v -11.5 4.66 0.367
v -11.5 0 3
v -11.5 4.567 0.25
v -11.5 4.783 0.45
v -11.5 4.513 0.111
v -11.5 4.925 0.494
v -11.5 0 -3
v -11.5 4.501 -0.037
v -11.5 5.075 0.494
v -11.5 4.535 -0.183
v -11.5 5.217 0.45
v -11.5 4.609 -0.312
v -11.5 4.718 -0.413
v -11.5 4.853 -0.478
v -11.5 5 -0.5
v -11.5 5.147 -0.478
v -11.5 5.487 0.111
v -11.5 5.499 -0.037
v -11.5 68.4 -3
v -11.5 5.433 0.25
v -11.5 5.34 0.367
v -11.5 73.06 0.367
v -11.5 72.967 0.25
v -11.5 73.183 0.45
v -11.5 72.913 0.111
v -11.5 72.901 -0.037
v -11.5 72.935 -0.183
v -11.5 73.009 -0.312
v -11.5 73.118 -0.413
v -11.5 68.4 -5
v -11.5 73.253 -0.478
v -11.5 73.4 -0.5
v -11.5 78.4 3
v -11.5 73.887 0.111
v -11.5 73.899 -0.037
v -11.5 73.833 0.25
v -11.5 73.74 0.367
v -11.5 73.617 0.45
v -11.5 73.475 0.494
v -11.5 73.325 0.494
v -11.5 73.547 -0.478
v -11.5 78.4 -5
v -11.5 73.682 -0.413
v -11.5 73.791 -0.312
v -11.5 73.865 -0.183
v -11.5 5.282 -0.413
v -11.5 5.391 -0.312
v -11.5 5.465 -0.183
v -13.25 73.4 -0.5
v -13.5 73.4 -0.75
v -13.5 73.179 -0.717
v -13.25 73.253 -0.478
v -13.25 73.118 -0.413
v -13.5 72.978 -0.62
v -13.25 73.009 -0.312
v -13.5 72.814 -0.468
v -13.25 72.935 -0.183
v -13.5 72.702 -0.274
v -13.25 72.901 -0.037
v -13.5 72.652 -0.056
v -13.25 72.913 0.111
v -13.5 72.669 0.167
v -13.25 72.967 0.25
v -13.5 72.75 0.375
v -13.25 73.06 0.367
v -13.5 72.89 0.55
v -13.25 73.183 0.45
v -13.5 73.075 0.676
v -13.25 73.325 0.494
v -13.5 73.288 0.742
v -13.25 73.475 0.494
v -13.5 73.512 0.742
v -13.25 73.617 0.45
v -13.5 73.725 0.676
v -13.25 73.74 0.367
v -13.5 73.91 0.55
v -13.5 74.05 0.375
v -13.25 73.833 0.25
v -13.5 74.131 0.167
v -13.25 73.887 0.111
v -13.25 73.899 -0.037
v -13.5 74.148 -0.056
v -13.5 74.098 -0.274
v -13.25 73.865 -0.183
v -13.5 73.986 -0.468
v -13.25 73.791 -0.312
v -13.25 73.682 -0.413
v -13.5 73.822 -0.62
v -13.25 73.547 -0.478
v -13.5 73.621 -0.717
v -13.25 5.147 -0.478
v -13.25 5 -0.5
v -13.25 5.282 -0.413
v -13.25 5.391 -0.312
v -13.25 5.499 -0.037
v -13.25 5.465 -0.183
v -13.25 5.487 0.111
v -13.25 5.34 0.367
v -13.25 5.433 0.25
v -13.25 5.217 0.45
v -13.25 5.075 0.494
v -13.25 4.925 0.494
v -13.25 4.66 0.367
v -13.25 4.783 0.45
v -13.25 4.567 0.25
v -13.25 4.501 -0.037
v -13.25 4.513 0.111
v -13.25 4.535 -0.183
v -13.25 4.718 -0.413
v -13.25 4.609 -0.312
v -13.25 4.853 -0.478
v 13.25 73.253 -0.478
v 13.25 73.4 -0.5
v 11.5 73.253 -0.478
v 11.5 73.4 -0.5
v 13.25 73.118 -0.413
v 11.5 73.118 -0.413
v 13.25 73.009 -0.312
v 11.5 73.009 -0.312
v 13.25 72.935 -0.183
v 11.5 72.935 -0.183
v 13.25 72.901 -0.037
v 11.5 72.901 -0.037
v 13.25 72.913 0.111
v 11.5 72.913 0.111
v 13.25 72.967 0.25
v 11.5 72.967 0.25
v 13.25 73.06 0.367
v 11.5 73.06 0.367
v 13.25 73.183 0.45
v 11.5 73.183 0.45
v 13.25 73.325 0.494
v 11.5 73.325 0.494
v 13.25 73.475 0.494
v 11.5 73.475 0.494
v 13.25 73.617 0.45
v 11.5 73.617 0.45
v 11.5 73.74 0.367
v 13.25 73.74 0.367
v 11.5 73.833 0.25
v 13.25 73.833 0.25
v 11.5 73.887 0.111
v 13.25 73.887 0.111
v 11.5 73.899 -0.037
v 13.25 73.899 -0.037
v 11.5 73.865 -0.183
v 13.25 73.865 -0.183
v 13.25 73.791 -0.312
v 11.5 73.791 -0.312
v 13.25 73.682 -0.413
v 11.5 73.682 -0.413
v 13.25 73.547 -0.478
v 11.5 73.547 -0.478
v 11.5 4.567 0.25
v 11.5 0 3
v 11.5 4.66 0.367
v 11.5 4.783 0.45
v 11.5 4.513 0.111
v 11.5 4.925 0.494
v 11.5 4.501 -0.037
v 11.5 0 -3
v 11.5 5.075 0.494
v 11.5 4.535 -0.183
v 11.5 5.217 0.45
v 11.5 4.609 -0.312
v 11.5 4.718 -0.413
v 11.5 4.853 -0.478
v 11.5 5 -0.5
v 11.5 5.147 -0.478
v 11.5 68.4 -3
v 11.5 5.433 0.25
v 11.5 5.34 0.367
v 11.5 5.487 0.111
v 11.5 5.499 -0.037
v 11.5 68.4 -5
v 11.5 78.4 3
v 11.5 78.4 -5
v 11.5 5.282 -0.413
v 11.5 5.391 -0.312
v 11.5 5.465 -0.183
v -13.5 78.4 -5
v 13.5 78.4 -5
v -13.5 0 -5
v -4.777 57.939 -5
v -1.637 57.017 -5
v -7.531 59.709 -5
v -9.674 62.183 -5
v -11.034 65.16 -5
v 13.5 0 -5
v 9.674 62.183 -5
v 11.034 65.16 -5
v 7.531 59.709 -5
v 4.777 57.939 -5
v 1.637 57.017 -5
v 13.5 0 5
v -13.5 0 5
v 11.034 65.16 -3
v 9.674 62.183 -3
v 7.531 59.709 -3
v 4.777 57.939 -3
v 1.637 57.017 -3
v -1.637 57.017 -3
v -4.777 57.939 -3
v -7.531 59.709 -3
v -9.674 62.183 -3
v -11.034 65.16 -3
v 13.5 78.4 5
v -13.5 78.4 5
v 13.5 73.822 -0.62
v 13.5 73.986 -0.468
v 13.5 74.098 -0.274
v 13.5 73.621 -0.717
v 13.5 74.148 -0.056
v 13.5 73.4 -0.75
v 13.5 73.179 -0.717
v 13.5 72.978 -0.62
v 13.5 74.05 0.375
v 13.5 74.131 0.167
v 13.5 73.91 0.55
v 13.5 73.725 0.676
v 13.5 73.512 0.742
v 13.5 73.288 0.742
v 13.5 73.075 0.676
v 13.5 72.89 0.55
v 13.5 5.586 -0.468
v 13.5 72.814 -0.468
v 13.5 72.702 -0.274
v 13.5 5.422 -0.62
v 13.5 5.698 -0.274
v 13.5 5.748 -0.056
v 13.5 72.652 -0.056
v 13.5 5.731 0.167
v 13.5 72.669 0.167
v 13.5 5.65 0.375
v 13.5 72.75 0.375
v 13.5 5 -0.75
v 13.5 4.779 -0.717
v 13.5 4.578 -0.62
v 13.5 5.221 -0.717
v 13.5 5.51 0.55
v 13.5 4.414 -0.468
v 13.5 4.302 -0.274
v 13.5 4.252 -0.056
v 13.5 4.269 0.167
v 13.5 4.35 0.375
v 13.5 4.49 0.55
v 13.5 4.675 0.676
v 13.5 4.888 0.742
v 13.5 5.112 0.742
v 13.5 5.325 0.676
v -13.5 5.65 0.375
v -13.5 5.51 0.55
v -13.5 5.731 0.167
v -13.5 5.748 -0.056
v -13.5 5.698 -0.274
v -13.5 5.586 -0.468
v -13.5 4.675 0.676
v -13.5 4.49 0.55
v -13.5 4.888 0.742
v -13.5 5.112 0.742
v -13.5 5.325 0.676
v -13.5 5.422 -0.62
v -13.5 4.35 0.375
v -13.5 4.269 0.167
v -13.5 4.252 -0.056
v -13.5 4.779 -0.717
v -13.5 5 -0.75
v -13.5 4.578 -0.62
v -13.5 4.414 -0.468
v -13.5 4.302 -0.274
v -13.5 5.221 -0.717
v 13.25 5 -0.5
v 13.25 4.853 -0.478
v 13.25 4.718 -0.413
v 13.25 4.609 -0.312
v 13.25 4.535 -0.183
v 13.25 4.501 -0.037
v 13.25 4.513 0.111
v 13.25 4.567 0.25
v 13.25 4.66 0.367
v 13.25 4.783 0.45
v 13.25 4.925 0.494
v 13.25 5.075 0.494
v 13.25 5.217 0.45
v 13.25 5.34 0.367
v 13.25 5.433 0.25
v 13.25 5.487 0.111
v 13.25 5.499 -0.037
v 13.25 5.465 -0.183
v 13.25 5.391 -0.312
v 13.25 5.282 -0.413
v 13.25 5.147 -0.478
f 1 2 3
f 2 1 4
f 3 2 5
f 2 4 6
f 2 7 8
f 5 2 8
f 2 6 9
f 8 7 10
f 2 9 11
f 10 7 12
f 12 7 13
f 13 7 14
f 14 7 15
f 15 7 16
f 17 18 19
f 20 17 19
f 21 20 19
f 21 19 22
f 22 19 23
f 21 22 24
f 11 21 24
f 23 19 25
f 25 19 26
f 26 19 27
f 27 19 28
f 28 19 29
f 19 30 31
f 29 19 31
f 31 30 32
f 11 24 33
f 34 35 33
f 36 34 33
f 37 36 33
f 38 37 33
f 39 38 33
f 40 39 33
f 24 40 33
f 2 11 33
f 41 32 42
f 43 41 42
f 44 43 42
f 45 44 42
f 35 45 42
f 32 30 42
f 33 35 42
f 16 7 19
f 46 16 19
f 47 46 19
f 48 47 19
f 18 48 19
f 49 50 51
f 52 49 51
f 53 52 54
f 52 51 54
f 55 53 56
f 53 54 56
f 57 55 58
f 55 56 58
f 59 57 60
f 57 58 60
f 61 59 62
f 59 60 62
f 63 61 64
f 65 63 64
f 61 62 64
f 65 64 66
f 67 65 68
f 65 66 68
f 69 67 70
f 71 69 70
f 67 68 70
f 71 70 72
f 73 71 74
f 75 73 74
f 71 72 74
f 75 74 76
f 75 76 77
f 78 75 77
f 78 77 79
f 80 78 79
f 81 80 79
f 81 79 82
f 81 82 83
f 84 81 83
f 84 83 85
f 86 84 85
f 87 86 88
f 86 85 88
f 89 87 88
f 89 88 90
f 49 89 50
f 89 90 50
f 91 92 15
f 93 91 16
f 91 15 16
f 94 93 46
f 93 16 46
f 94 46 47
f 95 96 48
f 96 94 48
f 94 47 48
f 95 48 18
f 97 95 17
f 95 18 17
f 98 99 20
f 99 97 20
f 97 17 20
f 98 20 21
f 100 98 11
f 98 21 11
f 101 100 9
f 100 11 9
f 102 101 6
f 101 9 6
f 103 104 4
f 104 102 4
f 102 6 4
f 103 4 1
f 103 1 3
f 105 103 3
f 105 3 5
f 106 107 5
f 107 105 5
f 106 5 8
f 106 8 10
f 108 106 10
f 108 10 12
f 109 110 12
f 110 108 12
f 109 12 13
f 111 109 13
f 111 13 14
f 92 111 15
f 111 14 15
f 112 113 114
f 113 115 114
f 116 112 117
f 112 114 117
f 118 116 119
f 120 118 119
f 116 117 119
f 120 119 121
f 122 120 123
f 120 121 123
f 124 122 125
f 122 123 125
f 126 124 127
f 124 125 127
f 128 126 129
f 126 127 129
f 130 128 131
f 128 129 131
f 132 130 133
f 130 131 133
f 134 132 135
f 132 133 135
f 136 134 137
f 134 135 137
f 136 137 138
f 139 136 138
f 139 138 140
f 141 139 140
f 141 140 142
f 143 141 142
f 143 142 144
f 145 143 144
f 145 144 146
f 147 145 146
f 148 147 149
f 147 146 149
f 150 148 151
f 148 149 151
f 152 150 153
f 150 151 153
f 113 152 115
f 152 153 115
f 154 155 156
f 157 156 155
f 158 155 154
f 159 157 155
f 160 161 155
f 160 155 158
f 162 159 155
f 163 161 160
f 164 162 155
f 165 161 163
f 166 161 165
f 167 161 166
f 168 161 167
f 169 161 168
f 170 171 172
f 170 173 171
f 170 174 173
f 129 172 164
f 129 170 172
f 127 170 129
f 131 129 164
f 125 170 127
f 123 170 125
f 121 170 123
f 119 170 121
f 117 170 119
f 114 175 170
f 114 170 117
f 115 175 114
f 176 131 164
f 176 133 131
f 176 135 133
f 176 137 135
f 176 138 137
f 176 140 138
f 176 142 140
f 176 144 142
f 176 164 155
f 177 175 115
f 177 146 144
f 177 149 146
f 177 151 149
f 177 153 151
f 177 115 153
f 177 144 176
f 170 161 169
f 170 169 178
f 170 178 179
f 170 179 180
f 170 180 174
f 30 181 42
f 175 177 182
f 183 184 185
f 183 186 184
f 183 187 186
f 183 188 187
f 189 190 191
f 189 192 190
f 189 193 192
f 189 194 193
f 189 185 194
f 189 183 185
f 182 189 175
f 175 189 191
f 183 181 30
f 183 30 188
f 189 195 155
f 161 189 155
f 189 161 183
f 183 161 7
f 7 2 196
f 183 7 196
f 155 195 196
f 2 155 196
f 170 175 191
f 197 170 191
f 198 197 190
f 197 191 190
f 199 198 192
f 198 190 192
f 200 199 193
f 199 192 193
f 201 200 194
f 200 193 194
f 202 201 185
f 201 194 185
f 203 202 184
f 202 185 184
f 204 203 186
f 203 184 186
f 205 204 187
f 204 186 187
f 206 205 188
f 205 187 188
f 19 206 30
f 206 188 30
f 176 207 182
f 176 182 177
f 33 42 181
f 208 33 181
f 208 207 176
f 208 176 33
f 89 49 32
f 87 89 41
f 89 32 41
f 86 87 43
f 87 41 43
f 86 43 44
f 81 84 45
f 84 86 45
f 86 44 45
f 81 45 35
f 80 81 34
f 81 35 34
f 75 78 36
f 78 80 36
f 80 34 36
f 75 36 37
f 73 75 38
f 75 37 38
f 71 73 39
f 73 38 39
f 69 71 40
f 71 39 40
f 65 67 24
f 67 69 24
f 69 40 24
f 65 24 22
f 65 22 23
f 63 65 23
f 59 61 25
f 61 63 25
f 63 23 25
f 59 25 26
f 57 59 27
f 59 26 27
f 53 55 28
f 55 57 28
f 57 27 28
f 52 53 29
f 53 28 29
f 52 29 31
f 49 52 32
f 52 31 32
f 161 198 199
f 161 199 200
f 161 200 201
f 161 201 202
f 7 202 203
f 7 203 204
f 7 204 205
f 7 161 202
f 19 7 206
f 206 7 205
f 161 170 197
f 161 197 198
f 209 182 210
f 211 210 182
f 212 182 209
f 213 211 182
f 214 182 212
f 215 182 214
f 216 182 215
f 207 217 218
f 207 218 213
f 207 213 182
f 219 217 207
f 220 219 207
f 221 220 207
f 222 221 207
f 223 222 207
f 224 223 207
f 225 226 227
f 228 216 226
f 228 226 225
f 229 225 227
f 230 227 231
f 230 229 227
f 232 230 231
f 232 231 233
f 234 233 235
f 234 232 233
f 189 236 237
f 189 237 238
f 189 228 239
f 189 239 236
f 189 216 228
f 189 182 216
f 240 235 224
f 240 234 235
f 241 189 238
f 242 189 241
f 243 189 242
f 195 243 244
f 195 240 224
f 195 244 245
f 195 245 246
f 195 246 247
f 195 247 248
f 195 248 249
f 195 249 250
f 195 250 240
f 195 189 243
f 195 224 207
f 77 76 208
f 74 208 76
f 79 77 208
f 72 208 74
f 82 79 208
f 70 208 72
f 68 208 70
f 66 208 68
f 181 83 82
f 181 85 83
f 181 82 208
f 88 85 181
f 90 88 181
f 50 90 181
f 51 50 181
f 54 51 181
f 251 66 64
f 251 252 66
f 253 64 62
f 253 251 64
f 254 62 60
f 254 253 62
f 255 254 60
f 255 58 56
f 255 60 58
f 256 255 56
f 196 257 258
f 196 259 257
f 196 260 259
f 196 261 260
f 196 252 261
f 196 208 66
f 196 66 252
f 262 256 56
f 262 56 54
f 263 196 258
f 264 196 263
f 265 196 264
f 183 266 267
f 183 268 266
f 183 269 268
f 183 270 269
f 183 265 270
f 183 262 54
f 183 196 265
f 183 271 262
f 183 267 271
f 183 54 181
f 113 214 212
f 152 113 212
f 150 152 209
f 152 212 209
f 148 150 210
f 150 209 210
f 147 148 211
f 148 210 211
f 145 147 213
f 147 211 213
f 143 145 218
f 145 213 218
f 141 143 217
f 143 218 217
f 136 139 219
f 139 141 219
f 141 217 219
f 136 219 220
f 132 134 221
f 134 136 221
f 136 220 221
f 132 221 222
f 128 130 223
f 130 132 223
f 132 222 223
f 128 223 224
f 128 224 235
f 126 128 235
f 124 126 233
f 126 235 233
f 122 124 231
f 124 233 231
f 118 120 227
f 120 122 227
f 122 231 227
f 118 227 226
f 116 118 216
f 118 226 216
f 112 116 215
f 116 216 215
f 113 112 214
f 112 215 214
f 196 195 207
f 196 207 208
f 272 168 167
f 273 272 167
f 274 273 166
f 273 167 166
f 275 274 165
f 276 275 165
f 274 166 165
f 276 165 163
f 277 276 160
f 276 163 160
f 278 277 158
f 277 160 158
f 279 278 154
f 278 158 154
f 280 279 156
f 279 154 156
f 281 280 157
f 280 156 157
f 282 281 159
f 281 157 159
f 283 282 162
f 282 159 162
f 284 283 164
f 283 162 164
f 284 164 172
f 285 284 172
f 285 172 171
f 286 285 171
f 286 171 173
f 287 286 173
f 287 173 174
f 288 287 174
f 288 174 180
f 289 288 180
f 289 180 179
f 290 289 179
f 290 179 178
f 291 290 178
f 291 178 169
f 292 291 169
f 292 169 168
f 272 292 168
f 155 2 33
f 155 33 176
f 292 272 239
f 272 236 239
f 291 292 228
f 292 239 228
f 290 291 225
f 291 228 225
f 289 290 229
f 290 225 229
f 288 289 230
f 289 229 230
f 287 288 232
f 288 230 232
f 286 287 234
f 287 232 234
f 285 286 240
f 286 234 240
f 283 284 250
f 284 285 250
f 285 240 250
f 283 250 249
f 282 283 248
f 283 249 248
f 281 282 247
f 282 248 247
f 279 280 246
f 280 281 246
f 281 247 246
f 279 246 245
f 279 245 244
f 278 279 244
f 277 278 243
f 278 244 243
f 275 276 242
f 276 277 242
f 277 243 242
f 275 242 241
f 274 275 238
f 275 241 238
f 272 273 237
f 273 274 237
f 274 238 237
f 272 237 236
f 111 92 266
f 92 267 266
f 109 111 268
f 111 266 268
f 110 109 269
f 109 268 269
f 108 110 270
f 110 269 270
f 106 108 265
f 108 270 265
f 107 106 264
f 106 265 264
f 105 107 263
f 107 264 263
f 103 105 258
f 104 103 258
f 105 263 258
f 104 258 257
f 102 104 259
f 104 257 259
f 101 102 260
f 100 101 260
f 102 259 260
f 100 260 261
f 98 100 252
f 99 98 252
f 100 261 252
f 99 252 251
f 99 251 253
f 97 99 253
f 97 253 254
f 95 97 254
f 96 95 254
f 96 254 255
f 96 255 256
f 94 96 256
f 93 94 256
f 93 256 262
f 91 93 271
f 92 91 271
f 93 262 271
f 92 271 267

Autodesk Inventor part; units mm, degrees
ref_plane "YZ Plane" through (0, 0, 0) normal (1, 0, 0) x (0, 1, 0)
ref_plane "XZ Plane" through (0, 0, 0) normal (0, 1, 0) x (-1, 0, 0)
ref_plane "XY Plane" through (0, 0, 0) normal (0, 0, 1) x (1, 0, 0)
sketch "Эскиз1" plane through (0, 0, 0) normal (0, 1, 0) x (-1, 0, 0)
  line L0 (13.5, -5) -> (-13.5, -5)
  line L1 (-13.5, -5) -> (-13.5, 5)
  line L2 (-13.5, 5) -> (13.5, 5)
  line L3 (13.5, 5) -> (13.5, -5)
  line L4 (-13.5, -5) -> (13.5, 5) construction
  line L5 (13.5, -5) -> (-13.5, 5) construction
  line L6 (-11.5, -3) -> (11.5, -3)
  line L7 (11.5, -3) -> (11.5, 3)
  line L8 (11.5, 3) -> (-11.5, 3)
  line L9 (-11.5, 3) -> (-11.5, -3)
  point P0 (0, 0)
  point P1 (0, 0)
  dimension "d0" = 27
  dimension "d1" = 10
  dimension "d2" = 2
extrude "Выдавливание1" add sketch "Эскиз1" along normal blind 78.4
sketch "Эскиз2" plane through (13.5, 0, 5) normal (1, 0, 0) x (0, 0, -1)
  line L0 (0, 78.4) -> (10, 78.4) construction
  line L1 (10, 78.4) -> (0, 68.4) construction
  line L2 (0, 0) -> (0, 78.4) construction
  line L3 (0, 78.4) -> (10, 68.4) construction
  line L4 (10, 0) -> (10, 78.4) construction
  line L5 (10, 0) -> (0, 10) construction
  line L6 (0, 0) -> (10, 10) construction
  circle A0 centre (5, 73.4) radius 0.5
  circle A1 centre (5, 5) radius 0.5
  point P0 (5, 0)
  dimension "d5" = 1
  dimension "d6" = 1
sketch "Эскиз3" plane through (13.5, 0, -5) normal (0, 0, -1) x (-1, 0, 0)
  line L0 (0, 0) -> (0, 78.4) projected
  line L1 (27, 0) -> (27, 78.4) projected
  line L2 (27, 0) -> (27, 78.4) projected
  line L3 (0, 0) -> (0, 78.4) projected
  line L4 (0, 78.4) -> (27, 78.4) projected
  arc A0 (2, 68.4) -> (25, 68.4) centre (13.5, 68.4) ccw
  line L5 (25, 0) -> (25, 78.4) projected
  line L6 (2, 0) -> (2, 78.4) projected
  line L7 (25, 0) -> (25, 78.4) projected
  line L8 (25, 68.4) -> (25, 78.4)
  line L9 (25, 78.4) -> (2, 78.4)
  line L10 (2, 68.4) -> (2, 78.4)
  point P0 (13.5, 0)
  dimension "d10" = 10
extrude "Выдавливание3" cut sketch "Эскиз3" against normal up to surface (2 mm away)
hole "Отверстие1" at (13.5, 73.4, 0) at (13.5, 5, 0) direction (-1, 0, 0) diameter 1 depth 13.5 countersink diameter 1.5 countersink angle 90
mirror "Зеркальное отражение1" about plane through (0, 0, 0) normal (1, 0, 0) of "Отверстие1"
properties part number "board-1-new"
